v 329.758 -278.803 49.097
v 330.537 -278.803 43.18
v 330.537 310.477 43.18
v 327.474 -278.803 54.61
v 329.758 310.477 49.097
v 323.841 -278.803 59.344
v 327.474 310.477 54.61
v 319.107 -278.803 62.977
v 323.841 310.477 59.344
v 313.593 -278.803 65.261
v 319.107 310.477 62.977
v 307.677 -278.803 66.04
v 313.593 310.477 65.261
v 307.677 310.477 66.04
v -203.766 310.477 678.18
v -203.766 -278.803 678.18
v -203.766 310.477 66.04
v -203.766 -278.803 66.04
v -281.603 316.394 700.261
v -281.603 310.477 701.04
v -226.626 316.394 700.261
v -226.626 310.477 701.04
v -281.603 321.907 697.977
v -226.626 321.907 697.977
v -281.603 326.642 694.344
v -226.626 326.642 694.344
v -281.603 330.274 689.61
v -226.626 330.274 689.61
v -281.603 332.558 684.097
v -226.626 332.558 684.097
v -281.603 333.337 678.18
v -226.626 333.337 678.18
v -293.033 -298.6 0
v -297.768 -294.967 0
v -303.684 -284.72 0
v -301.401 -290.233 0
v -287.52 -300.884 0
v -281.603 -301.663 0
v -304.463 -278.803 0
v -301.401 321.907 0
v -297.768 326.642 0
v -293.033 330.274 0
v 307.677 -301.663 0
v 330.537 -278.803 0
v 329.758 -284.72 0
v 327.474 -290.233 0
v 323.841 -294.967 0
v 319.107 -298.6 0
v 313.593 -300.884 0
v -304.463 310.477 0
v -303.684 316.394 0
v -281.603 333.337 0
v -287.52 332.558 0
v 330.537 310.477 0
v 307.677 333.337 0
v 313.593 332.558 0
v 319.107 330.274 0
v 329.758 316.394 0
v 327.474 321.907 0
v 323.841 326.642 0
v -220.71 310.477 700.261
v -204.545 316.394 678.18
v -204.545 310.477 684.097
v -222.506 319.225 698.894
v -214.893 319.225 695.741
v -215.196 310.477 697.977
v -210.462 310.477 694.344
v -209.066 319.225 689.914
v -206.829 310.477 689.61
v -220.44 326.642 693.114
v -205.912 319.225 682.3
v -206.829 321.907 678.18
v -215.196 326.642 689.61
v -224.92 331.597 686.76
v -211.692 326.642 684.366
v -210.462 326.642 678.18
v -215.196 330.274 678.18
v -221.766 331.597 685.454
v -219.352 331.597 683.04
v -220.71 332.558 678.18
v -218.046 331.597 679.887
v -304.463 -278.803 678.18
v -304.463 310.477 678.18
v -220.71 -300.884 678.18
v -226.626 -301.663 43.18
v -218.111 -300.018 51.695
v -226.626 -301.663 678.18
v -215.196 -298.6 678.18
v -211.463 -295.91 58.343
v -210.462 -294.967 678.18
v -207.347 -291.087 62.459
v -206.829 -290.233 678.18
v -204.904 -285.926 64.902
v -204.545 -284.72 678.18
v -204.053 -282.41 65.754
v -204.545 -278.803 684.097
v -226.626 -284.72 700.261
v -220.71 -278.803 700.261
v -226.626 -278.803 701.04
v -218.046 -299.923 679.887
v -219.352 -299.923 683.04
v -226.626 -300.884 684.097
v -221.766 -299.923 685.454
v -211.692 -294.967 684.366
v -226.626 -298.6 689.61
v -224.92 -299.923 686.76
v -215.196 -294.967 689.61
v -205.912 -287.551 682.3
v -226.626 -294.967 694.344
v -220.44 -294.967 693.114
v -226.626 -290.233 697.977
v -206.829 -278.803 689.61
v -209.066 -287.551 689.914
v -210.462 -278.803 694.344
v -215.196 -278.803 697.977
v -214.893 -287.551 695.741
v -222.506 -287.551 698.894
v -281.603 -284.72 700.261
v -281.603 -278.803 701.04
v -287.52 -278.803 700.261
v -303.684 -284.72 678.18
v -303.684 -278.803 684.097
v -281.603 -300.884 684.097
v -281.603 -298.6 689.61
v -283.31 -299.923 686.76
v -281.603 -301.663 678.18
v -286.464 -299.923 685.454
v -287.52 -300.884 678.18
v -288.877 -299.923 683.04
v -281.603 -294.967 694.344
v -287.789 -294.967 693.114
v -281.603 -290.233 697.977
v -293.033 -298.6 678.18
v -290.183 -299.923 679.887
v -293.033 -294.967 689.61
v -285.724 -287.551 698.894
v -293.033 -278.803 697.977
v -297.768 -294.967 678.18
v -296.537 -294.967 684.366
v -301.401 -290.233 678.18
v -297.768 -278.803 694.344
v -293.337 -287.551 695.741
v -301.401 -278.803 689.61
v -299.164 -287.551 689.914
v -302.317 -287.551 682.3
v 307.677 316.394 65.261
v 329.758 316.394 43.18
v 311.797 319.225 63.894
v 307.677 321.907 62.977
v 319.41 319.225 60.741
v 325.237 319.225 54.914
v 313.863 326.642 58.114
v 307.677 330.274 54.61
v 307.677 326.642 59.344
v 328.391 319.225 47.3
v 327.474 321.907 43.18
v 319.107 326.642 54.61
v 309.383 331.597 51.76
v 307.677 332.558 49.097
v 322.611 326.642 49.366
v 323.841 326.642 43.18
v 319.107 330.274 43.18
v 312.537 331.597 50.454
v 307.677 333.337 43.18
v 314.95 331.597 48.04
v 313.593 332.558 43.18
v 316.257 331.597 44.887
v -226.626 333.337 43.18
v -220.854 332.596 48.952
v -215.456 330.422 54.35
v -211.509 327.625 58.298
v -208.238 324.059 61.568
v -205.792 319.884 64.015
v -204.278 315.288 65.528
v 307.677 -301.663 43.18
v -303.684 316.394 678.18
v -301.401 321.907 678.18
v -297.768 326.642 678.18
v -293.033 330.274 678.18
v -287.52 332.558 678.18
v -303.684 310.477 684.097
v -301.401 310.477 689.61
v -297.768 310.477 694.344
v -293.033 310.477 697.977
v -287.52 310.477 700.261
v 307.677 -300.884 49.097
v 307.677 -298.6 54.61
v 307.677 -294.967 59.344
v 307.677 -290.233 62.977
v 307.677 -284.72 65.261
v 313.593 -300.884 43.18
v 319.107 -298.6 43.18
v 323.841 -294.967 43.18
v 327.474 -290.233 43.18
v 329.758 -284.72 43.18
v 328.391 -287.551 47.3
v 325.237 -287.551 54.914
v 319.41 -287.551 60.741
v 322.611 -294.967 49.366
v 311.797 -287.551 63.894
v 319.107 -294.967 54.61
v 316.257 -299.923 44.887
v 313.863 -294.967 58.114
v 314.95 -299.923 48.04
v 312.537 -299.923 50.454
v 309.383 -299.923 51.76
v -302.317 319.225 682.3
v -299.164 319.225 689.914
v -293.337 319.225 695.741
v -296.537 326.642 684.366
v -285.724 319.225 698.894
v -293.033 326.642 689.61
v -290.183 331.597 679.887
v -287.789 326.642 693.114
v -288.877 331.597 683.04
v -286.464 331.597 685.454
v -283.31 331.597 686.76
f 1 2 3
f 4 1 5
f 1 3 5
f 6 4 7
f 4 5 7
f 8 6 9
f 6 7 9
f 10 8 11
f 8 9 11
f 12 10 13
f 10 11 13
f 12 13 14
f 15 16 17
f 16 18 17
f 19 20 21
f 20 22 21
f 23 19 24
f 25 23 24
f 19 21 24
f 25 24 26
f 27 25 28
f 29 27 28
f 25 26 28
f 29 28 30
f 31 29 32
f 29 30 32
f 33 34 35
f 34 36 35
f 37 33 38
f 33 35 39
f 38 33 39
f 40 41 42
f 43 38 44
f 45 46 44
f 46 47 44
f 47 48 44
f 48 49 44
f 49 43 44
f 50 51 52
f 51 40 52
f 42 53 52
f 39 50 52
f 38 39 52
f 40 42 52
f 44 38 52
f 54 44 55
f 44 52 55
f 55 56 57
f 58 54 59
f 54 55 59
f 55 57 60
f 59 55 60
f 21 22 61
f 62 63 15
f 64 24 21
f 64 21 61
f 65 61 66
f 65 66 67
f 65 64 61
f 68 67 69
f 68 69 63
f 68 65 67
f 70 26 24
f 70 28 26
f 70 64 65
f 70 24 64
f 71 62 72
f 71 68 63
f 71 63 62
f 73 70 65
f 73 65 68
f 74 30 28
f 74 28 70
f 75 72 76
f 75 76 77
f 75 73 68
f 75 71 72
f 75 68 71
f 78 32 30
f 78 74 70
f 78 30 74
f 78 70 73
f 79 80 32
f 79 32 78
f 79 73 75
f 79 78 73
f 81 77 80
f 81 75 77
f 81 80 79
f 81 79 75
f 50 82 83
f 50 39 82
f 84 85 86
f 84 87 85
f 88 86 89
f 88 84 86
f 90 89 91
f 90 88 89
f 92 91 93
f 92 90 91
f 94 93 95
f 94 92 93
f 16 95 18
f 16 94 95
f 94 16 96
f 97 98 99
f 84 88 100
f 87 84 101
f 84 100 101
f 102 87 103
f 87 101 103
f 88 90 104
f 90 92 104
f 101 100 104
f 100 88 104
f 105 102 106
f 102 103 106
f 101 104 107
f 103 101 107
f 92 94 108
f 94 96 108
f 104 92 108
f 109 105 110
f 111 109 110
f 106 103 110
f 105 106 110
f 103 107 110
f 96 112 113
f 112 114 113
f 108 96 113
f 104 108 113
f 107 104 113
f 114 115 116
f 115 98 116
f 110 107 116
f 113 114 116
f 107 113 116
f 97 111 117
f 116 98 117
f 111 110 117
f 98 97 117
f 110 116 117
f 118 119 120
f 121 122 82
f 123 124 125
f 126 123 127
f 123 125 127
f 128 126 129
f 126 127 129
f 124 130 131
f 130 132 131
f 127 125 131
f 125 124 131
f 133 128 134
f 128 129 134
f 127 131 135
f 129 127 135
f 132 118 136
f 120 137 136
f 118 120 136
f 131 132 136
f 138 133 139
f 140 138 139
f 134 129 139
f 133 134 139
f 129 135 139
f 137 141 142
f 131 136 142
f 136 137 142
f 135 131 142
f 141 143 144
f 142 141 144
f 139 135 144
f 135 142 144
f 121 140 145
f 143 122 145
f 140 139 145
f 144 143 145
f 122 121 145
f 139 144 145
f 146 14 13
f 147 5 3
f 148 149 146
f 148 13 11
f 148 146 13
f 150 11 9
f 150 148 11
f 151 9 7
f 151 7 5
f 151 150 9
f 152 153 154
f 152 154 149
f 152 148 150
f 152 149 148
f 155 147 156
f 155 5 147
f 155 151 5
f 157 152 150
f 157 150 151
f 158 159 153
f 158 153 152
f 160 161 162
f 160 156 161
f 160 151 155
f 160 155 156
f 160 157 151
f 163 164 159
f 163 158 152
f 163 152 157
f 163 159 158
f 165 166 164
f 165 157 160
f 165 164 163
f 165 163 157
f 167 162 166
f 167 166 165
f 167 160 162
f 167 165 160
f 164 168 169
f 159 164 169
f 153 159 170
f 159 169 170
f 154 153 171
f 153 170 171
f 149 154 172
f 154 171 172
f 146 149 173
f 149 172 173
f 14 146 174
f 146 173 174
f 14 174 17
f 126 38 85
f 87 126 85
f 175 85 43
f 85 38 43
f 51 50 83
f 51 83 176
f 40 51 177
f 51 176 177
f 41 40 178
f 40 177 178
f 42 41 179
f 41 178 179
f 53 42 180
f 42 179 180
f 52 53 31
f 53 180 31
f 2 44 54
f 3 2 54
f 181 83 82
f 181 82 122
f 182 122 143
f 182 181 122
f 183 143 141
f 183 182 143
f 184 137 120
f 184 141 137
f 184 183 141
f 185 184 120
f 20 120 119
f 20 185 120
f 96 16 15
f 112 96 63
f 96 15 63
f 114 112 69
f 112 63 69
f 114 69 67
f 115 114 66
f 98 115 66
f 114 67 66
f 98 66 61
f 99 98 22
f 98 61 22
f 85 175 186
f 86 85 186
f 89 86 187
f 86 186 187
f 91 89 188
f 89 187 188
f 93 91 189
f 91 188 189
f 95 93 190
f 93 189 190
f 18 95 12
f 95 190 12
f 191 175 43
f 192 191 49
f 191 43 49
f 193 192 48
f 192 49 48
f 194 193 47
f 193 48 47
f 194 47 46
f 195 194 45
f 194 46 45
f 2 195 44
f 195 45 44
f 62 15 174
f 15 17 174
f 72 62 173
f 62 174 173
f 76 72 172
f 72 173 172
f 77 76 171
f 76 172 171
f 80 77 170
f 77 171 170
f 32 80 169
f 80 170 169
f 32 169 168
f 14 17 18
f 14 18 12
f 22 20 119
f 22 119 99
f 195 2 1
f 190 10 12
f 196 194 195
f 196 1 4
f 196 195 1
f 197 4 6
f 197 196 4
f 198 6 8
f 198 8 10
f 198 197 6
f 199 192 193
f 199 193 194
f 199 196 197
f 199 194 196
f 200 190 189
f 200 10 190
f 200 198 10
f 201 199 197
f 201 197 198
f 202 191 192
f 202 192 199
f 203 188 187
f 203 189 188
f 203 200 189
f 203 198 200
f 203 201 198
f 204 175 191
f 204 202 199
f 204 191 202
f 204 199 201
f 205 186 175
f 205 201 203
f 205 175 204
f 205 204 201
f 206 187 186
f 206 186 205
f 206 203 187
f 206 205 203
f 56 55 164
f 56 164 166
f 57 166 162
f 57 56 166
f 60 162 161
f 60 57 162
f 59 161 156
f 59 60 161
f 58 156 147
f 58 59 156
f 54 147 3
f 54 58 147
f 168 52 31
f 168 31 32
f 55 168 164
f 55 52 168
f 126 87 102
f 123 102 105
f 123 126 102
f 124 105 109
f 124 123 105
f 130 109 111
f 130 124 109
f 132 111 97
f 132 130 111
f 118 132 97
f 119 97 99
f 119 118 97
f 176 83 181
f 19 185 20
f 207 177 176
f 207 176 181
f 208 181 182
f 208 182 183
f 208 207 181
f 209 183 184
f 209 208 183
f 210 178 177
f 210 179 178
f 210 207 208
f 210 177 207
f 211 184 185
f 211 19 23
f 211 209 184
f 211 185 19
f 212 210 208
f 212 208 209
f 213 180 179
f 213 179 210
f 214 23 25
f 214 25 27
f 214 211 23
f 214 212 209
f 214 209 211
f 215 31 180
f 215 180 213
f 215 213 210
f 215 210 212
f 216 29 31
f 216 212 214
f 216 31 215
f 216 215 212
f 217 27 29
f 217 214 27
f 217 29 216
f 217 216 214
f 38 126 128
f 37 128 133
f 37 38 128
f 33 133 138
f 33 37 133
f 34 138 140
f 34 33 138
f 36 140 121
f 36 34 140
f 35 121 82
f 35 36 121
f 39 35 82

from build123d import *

# Parameters (mm, degrees)
F0_W         = 503.2831068337
F0_H         = 635
F0_W_2       = 131.7168931663
F1_DEPTH     = 66.04
F2_W         = 100.6971086562
F2_H         = 635
F3_DEPTH     = 635
F4_R         = 22.86
F5_R         = 22.86
F6_R         = 22.86
F7_T1_DEPTH  = 100.33
F7_S5_W      = 22.86
F7_S5_H      = 22.86
F7_T6_DEPTH  = 22.86
F7_S11_W     = 22.86
F7_S11_H     = 22.86
F7_T12_DEPTH = 22.86


# Not quite as in the source:
# - a fillet or chamfer that OpenCascade refuses, or shapes differently, is made with other operations: its cross-section is extruded or revolved along the edge and cut away or added


with BuildPart() as f1:
    # F0 (on Top) → F1 (new body)
    with BuildSketch(Plane.XY):
        with Locations((-52.821796909, 15.8370759291)):
            Rectangle(F0_W, F0_H)
        with Locations((264.678203091, 15.8370759291)):
            Rectangle(F0_W_2, F0_H)
    extrude(amount=F1_DEPTH)

    # F2 (on face) → F3 (join)
    with BuildSketch(Plane.XY.offset(66.04)):
        with Locations((-254.1147959977, 15.8370759291)):
            Rectangle(F2_W, F2_H)
    extrude(amount=F3_DEPTH)

    # F4
    f4_edges = [f1.edges().sort_by_distance(p)[0] for p in [
        (-203.766242, 15.837076, 701.04),
        (-304.46335, 15.837076, 701.04),
    ]]
    fillet(f4_edges, radius=F4_R)

    # F5
    f5_edges = [f1.edges().sort_by_distance(p)[0] for p in [
        (-203.766242, -301.662924, 372.11),
        (63.385204, -301.662924, 66.04),
        (330.53665, 15.837076, 66.04),
        (63.385204, 333.337076, 66.04),
    ]]
    fillet(f5_edges, radius=F5_R)

    # F6
    f6_edges = [f1.edges().sort_by_distance(p)[0] for p in [
        (-203.766242, 333.337076, 372.11),
        (-304.46335, 333.337076, 339.09),
    ]]
    fillet(f6_edges, radius=F6_R)

    # F7: fillet of radius 22.86 on 2 edges, made by hand

    # F7_s2 → F7_t1 (cut)
    with BuildSketch(Plane.XY.offset(-57.15)):
        with BuildLine():
            ThreePointArc((307.6766496742, 333.3370759291), (323.8411106921, 326.641536947), (330.5366496742, 310.4770759291))
            Line((330.5366496742, 310.4770759291), (330.5366496742, 333.3370759291))
            Line((330.5366496742, 333.3370759291), (307.6766496742, 333.3370759291))
        make_face()
        with BuildLine():
            ThreePointArc((307.6766496742, -301.6629240709), (323.8411106921, -294.9673850888), (330.5366496742, -278.8029240709))
            Line((330.5366496742, -278.8029240709), (330.5366496742, -301.6629240709))
            Line((330.5366496742, -301.6629240709), (307.6766496742, -301.6629240709))
        make_face()
    extrude(amount=F7_T1_DEPTH, mode=Mode.SUBTRACT)


with BuildPart() as f7_tool4:
    # F7_s5 → F7_t6 (new body)
    with BuildSketch(Plane.XZ.offset(278.8029240709)):
        with Locations((319.1066496742, 54.61)):
            Rectangle(F7_S5_W, F7_S5_H)
    extrude(amount=F7_T6_DEPTH)

    # F7_s7 → F7_t8 (revolve, cut)
    with BuildSketch(Plane(origin=(307.6766496742, -278.8029240709, 43.18), x_dir=(-0.7071067812, 0, -0.7071067812), z_dir=(-0.7071067812, 0, 0.7071067812))):
        with BuildLine():
            ThreePointArc((0, -22.86), (22.86, 0), (0, 22.86))
            Line((0, 22.86), (0, -22.86))
        make_face()
    revolve(axis=Axis((307.6766496742, -278.8029240709, 43.18), (0, -1, 0)), mode=Mode.SUBTRACT)


with BuildPart() as f1_1:
    add(f1.part)

    # F7_t3: cut F7_tool4
    add(f7_tool4.part, mode=Mode.SUBTRACT)


with BuildPart() as f7_tool10:
    # F7_s11 → F7_t12 (new body)
    with BuildSketch(Plane.XZ.offset(-310.4770759291)):
        with Locations((319.1066496742, 54.61)):
            Rectangle(F7_S11_W, F7_S11_H)
    extrude(amount=-F7_T12_DEPTH)

    # F7_s13 → F7_t14 (revolve, cut)
    with BuildSketch(Plane(origin=(307.6766496742, 310.4770759291, 43.18), x_dir=(-0.7071067812, 0, -0.7071067812), z_dir=(0.7071067812, 0, -0.7071067812))):
        with BuildLine():
            ThreePointArc((0, -22.86), (22.86, 0), (0, 22.86))
            Line((0, 22.86), (0, -22.86))
        make_face()
    revolve(axis=Axis((307.6766496742, 310.4770759291, 43.18), (0, 1, 0)), mode=Mode.SUBTRACT)


with BuildPart() as f1_2:
    add(f1_1.part)

    # F7_t9: cut F7_tool10
    add(f7_tool10.part, mode=Mode.SUBTRACT)


solid = f1_2.part
